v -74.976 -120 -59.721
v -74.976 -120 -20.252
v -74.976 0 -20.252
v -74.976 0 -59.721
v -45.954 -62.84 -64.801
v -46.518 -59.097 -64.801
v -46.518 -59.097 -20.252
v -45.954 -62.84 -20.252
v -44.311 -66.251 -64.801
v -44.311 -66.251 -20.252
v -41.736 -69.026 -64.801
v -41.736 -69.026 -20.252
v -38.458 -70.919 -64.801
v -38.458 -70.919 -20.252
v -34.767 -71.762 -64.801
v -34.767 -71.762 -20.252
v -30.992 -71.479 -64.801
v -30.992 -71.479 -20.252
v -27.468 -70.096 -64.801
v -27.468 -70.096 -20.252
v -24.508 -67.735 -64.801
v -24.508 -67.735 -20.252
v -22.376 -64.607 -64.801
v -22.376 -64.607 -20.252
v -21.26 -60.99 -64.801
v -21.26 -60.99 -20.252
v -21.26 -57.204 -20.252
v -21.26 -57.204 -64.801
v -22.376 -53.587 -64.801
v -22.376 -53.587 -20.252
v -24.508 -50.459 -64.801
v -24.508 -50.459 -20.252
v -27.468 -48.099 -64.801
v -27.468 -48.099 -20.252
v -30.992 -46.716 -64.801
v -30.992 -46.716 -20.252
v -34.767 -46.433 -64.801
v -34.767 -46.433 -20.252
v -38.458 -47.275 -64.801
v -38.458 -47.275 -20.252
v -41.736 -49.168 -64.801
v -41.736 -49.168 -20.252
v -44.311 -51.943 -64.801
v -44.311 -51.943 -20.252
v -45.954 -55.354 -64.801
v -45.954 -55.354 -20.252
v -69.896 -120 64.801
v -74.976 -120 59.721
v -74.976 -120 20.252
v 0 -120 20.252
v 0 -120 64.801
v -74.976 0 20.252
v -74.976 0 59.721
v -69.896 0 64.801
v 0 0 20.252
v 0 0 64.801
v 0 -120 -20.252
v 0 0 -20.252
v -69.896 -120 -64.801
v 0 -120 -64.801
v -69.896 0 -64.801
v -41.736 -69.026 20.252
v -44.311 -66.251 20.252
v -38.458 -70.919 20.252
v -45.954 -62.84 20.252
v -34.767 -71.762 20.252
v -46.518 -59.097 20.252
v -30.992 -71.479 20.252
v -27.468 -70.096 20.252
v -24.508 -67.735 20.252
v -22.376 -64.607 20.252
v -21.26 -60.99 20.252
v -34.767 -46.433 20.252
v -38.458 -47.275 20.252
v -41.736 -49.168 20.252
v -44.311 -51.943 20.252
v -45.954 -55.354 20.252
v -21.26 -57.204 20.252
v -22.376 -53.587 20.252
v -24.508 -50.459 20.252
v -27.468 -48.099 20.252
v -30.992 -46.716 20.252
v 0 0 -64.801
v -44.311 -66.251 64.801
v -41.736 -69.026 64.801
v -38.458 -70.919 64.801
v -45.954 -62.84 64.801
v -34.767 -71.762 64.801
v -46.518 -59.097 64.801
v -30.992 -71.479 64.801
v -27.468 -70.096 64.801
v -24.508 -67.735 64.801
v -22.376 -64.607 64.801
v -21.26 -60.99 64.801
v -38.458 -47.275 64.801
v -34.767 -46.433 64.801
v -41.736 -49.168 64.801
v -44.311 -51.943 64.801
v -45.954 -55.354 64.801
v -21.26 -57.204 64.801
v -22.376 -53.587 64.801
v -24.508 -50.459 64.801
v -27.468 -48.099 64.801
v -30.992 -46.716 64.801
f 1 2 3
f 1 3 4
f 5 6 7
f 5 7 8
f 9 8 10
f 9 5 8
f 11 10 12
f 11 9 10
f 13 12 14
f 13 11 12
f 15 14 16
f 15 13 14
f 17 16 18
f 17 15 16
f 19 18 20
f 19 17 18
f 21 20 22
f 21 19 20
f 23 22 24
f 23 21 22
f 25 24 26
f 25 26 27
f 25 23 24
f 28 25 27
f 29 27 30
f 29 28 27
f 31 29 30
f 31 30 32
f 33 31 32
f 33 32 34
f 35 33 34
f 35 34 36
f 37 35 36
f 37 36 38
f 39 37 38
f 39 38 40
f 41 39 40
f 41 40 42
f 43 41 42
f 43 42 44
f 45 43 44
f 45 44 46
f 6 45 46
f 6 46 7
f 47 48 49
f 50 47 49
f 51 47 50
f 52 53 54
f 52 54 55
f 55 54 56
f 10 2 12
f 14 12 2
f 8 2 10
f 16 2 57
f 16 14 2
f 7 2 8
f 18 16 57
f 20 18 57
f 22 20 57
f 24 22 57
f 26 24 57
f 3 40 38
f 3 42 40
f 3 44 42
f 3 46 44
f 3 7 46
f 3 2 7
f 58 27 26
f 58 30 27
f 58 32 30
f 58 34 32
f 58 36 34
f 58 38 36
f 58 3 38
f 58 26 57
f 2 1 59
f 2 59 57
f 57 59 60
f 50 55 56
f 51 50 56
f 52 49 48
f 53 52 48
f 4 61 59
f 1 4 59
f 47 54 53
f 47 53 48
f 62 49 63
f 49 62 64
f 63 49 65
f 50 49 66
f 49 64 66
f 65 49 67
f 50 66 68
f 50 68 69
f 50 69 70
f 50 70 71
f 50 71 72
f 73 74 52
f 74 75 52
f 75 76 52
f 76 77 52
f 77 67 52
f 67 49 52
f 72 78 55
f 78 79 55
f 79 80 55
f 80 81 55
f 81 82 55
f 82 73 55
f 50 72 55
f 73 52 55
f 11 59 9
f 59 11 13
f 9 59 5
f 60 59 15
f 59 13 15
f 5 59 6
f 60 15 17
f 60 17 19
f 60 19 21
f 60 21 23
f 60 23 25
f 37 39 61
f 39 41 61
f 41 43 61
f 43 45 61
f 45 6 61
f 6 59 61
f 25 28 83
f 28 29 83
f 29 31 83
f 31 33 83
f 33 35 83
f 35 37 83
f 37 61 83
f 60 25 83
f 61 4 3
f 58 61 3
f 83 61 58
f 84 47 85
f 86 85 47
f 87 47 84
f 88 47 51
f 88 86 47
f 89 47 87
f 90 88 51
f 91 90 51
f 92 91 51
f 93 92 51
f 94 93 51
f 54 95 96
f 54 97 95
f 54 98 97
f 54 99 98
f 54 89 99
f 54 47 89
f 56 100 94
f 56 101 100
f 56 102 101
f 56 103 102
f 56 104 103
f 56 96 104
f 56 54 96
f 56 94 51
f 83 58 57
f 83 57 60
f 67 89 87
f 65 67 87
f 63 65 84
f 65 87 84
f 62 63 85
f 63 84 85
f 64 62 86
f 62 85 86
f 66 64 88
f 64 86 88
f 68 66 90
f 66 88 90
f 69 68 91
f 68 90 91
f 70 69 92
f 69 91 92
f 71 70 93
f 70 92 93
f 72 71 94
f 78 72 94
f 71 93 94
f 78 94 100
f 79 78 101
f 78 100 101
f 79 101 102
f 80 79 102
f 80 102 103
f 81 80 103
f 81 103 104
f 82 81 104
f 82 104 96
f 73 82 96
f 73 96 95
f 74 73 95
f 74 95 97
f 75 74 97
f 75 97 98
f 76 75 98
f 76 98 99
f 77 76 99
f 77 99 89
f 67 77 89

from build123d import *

# Parameters (mm, degrees)
F0_W     = 74.97561
F0_H     = 44.549288
F1_DEPTH = 120
F2_SIZE  = 5.08
F4_D     = 25.4


with BuildPart() as f1:
    # F0 (on Front) → F1 (new body)
    with BuildSketch(Plane.XZ):
        with Locations((-37.487805, 42.526632)):
            Rectangle(F0_W, F0_H)
    extrude(amount=F1_DEPTH)

    # F2
    f2_edges = [f1.edges().sort_by_distance(p)[0] for p in [
        (-74.97561, -60, 64.801276),
    ]]
    chamfer(f2_edges, length=F2_SIZE)

    # F4 (through all)
    with Locations(Plane(origin=(0, 0, 20.251988), x_dir=(1, 0, 0), z_dir=(0, 0, -1))):
        with Locations((-33.818021, 59.097089)):
            Hole(F4_D / 2)


with BuildPart() as f5_1:
    # F5: instance of F1
    add(f1.part.mirror(Plane.XY))


solid = Compound([f1.part, f5_1.part])
